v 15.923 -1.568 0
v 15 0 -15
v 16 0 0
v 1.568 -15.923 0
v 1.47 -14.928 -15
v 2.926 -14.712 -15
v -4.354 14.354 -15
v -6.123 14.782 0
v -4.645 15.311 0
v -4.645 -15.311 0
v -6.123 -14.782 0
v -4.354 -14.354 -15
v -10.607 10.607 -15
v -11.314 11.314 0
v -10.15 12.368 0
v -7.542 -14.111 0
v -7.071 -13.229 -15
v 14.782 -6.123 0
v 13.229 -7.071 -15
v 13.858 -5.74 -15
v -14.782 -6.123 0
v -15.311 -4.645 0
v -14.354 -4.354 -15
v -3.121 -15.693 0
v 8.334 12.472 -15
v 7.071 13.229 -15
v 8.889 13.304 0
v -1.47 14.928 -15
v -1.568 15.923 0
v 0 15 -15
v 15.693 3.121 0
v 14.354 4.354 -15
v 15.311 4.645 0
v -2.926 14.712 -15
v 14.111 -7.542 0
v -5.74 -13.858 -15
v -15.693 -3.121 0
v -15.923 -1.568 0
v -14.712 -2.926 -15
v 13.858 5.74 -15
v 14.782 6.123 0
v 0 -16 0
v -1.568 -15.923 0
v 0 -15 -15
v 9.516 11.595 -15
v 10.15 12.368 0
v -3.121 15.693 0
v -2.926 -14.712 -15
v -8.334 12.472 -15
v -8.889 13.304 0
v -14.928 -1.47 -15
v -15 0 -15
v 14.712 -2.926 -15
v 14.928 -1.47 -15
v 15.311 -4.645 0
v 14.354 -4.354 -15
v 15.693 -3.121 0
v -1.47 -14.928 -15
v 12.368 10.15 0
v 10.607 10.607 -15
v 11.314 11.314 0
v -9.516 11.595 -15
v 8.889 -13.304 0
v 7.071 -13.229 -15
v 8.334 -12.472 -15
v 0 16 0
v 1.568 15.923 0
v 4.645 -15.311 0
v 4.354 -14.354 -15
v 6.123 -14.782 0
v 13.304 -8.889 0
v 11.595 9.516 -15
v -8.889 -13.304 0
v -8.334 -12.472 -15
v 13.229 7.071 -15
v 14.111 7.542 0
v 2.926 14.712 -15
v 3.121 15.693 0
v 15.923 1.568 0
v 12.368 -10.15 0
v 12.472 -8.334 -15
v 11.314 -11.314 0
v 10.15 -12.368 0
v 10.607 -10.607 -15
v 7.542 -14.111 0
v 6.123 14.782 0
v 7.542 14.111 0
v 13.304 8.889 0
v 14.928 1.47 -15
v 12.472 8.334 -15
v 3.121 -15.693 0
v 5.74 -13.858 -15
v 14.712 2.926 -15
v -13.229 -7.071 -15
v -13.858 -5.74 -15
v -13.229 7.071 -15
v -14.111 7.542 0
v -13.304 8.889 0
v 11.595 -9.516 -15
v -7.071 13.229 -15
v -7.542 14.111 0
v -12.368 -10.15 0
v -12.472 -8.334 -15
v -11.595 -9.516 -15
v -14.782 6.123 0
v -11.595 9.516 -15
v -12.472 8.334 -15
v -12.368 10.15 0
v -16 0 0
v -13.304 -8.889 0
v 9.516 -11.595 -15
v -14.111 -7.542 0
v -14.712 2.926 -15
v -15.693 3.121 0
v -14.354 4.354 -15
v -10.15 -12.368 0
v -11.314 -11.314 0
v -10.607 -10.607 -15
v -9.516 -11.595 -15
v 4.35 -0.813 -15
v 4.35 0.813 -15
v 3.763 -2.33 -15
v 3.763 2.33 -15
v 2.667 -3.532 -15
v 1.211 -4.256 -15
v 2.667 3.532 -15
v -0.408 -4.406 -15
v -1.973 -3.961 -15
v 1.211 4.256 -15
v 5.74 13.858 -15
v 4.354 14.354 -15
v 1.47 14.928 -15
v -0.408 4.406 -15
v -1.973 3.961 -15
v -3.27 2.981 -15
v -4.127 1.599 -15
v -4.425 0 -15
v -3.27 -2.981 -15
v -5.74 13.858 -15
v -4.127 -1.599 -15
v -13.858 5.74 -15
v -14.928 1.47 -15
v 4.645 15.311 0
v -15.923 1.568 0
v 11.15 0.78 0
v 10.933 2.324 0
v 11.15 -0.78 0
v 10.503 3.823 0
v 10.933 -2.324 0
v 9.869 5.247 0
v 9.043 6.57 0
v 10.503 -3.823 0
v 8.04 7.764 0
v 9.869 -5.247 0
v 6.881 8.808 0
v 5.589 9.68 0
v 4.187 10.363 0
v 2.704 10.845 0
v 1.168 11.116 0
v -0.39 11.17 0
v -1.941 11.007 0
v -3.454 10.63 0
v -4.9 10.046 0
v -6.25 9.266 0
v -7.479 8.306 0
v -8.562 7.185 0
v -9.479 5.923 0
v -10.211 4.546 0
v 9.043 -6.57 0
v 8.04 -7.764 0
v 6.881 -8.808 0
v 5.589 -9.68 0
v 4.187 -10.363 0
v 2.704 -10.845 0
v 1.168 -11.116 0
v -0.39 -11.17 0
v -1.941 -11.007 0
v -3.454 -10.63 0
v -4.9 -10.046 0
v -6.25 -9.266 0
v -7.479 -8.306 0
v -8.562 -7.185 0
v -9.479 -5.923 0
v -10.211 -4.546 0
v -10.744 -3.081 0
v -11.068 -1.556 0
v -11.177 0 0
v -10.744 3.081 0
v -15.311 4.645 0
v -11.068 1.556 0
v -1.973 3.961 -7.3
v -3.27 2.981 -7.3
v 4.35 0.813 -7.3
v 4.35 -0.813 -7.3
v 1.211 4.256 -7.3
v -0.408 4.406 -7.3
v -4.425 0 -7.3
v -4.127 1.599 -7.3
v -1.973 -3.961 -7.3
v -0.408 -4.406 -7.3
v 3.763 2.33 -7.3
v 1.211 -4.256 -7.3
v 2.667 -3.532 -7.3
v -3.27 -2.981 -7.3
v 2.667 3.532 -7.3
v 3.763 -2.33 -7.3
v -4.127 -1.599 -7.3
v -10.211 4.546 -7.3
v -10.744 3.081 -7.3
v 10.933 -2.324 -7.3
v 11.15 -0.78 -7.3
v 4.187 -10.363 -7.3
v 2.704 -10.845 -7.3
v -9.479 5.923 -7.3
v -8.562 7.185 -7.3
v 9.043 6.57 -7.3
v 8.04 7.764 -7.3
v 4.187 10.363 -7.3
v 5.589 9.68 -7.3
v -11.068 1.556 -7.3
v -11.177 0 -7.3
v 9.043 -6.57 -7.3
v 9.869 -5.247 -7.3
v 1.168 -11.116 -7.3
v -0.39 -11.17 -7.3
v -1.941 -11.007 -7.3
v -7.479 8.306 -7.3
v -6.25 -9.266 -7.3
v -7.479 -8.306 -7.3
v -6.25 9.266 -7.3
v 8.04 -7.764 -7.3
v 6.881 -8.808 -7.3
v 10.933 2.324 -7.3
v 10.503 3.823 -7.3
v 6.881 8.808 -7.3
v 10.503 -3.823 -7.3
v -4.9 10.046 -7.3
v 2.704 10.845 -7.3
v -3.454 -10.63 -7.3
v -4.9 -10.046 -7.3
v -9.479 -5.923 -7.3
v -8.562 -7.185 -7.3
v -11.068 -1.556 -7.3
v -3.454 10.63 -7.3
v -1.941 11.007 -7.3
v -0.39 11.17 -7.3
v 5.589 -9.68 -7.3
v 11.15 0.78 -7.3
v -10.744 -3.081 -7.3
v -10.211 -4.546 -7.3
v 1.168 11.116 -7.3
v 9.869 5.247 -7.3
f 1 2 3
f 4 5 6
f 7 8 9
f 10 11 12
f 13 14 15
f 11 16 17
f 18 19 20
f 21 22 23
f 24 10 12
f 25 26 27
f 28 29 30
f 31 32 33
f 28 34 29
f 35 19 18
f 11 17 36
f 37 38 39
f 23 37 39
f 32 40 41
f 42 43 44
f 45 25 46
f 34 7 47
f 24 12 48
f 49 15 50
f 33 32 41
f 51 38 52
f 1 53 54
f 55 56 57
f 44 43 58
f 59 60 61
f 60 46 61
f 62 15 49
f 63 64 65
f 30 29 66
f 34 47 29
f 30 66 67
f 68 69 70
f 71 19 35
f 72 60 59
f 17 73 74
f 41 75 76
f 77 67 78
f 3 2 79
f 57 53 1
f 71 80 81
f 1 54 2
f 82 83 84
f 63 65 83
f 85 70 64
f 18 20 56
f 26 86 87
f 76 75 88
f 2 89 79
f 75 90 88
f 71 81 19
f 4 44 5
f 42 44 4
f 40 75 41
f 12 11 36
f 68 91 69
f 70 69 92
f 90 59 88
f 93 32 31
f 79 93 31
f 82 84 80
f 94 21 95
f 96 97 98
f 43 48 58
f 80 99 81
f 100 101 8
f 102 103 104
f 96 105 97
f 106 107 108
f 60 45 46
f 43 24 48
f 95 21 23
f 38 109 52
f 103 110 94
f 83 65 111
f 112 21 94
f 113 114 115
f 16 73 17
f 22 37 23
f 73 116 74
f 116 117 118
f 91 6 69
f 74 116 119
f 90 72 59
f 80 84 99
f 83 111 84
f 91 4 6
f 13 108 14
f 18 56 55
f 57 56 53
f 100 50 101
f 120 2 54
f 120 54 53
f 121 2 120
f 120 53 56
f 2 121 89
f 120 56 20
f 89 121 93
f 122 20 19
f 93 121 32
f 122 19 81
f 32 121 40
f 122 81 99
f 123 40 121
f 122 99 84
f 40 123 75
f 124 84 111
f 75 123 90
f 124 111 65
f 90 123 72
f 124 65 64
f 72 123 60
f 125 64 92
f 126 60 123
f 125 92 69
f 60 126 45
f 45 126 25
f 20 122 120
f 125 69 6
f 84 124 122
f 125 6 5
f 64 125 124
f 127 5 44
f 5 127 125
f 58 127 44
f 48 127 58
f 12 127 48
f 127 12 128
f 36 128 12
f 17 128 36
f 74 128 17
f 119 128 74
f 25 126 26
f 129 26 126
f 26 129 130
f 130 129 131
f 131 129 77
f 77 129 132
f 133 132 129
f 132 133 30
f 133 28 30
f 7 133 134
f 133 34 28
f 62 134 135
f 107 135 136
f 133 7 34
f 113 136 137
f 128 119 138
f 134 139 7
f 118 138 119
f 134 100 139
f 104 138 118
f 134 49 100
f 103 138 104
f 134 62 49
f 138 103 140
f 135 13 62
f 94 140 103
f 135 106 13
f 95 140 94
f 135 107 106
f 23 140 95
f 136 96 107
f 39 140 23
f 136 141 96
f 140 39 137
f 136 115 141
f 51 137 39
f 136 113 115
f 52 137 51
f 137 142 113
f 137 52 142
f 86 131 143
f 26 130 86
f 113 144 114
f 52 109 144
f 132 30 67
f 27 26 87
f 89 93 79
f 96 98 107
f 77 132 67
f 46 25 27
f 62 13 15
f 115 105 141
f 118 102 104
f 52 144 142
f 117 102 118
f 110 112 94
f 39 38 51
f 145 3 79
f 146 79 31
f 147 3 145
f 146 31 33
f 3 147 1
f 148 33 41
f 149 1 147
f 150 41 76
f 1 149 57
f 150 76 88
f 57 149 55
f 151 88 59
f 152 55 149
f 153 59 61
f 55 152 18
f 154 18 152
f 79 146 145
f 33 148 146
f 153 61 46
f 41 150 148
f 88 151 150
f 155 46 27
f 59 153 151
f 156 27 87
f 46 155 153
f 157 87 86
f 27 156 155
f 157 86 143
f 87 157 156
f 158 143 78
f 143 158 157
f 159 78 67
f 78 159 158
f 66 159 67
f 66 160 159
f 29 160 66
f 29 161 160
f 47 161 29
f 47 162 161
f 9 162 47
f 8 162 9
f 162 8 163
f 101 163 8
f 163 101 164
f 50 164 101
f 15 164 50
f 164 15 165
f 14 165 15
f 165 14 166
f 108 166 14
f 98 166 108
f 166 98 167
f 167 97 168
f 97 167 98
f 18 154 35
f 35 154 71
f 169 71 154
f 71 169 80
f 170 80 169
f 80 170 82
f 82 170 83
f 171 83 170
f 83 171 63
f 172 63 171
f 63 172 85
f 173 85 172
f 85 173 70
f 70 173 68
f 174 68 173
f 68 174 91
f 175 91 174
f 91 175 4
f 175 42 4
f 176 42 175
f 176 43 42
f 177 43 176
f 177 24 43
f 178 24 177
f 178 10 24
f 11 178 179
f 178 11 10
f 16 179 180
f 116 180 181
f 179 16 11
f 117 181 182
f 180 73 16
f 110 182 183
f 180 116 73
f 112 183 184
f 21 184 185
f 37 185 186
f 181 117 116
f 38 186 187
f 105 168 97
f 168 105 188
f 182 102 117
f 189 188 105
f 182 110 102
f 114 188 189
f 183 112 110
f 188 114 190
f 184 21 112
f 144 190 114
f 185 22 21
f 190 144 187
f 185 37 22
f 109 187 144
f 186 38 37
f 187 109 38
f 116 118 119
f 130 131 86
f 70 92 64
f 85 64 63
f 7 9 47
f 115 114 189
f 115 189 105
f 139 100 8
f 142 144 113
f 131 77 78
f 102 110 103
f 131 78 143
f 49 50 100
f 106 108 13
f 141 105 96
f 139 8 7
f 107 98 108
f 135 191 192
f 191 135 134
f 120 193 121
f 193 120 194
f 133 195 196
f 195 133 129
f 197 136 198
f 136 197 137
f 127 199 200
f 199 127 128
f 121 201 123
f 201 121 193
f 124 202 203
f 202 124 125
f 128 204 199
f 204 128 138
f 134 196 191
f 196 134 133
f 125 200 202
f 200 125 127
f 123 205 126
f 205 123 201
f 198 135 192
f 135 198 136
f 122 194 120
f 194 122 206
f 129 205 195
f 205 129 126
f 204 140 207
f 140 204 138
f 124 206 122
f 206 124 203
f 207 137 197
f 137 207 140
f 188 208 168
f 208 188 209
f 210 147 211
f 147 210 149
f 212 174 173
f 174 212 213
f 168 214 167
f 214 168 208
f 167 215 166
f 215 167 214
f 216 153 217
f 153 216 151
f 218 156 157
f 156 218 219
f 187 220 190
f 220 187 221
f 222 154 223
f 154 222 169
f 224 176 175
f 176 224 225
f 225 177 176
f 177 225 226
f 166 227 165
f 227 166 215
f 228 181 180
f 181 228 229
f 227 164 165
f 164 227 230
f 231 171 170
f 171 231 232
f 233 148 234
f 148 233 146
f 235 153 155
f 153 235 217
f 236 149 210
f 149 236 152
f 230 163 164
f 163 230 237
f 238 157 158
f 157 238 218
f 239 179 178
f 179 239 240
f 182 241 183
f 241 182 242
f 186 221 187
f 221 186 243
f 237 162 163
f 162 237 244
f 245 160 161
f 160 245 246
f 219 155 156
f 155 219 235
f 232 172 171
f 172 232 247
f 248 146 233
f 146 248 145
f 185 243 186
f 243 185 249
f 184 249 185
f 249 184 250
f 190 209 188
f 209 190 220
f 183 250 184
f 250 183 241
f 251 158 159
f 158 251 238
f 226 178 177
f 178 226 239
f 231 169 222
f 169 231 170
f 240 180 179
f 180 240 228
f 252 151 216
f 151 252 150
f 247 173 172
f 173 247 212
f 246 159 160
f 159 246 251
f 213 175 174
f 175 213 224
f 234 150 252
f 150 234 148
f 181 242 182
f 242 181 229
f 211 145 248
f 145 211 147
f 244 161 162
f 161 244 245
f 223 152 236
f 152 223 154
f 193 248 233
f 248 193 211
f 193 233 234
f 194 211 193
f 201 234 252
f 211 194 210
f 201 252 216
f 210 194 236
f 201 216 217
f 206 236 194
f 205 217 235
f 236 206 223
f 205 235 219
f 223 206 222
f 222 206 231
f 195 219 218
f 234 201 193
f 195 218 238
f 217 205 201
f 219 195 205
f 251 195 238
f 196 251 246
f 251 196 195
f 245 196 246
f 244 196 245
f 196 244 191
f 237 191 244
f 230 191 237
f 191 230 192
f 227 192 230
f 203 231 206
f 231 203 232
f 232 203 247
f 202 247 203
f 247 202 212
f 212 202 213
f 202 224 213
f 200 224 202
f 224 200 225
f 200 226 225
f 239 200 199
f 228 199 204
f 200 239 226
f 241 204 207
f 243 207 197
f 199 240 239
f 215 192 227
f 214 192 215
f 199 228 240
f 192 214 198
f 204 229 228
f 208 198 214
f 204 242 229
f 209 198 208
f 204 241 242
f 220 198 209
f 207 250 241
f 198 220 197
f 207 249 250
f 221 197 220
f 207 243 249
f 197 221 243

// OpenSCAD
// file: inc/functions.scad
// PRUSA iteration3
// Functions used in many files
// GNU GPL v3
// Josef Průša <josefprusa@me.com>
// Václav 'ax' Hůla <axtheb@gmail.com>
// Vlnofka <>
// http://www.reprap.org/wiki/Prusa_Mendel
// http://github.com/prusajr/PrusaMendel

module roundcorner(diameter){
	difference(){
		cube(size = [diameter,diameter,99], center = false);
		translate(v = [diameter, diameter, 0]) cylinder(h = 100, r=diameter, center=true);
	}
}
module nut(d,h,horizontal=true){
    cornerdiameter =  (d / 2) / cos (180 / 6);
    cylinder(h = h, r = cornerdiameter, $fn = 6);
    if(horizontal){
        for(i = [1:6]){
            rotate([0,0,60*i]) translate([-cornerdiameter-0.2,0,0]) rotate([0,0,-45]) cube([2,2,h]);
        }
    }
}

// Based on nophead research
module polyhole(d, h, center=false) {
    n = max(round(2 * d),3);
    rotate([0,0,180])
        cylinder(h = h, r = (d / 2) / cos (180 / n), $fn = n);
}

// make it interchangeable between this and cylinder
module cylinder_poly(r, h, center=false){
    polyhole(d=r*2, h=h, center=center);
}

module fillet(radius, height=100, $fn=0) {
    //this creates acutal fillet
    translate([-radius, -radius, -height/2-0.01])
        difference() {
            cube([radius*2, radius*2, height+0.02]);
            cylinder(r=radius, h=height+0.02, $fn=$fn);
        }
}

module cube_fillet(size, radius=-1, vertical=[3,3,3,3], top=[0,0,0,0], bottom=[0,0,0,0], center=false, $fn=0){
    //
    if (center) {
        cube_fillet_inside(size, radius, vertical, top, bottom, $fn);
    } else {
        translate([size[0]/2, size[1]/2, size[2]/2])
            cube_fillet_inside(size, radius, vertical, top, bottom, $fn);
    }
}

module cube_negative_fillet(size, radius=-1, vertical=[3,3,3,3], top=[0,0,0,0], bottom=[0,0,0,0], $fn=0){

    j=[1,0,1,0];

    for (i=[0:3]) {
        if (radius > -1) {
            rotate([0, 0, 90*i]) translate([size[1-j[i]]/2, size[j[i]]/2, 0]) fillet(radius, size[2], $fn=$fn);
        } else {
            rotate([0, 0, 90*i]) translate([size[1-j[i]]/2, size[j[i]]/2, 0]) fillet(vertical[i], size[2], $fn=$fn);
        }
        rotate([90*i, -90, 0]) translate([size[2]/2, size[j[i]]/2, 0 ]) fillet(top[i], size[1-j[i]], $fn=$fn);
        rotate([90*(4-i), 90, 0]) translate([size[2]/2, size[j[i]]/2, 0]) fillet(bottom[i], size[1-j[i]], $fn=$fn);

    }
}

module cube_fillet_inside(size, radius=-1, vertical=[3,3,3,3], top=[0,0,0,0], bottom=[0,0,0,0], $fn=0){
    //makes CENTERED cube with round corners
    // if you give it radius, it will fillet vertical corners.
    //othervise use vertical, top, bottom arrays
    //when viewed from top, it starts in upper right corner (+x,+y quadrant) , goes counterclockwise
    //top/bottom fillet starts in direction of Y axis and goes CCW too


    if (radius == 0) {
        cube(size, center=true);
    } else {
        difference() {
            cube(size, center=true);
            cube_negative_fillet(size, radius, vertical, top, bottom, $fn);
        }
    }
}


module nema17(places=[1,1,1,1], size=15.5, h=10, holes=false, shadow=false, $fn=24){
    for (i=[0:3]) {
        if (places[i] == 1) {
            rotate([0, 0, 90*i]) translate([size, size, 0]) {
                if (holes) {
                    #rotate([0, 0, -90*i])  translate([0,0,-10]) screw(r=1.7, slant=false, head_drop=13, $fn=$fn, h=h+12);
                } else {
                    rotate([0, 0, -90*i]) cylinder(h=h, r=5.5, $fn=$fn);
                }
            }
        }
    }
    if (shadow != false) {
        %translate ([0, 0, shadow+21+3]) cube([42,42,42], center = true);
    //flange
        %translate ([0, 0, shadow+21+3-21-1]) cylinder(r=11,h=2, center = true, $fn=20);
    //shaft
        %translate ([0, 0, shadow+21+3-21-7]) cylinder(r=2.5,h=14, center = true);
    }
}

module screw(h=20, r=2, r_head=3.5, head_drop=0, slant=true, poly=false, $fn=0){
    //makes screw with head
    //for substraction as screw hole
    if (poly) {
        cylinder_poly(h=h, r=r, $fn=$fn);
    } else {
        cylinder(h=h, r=r, $fn=$fn);
    }
    if (slant) {
        translate([0, 0, head_drop-0.01]) cylinder(h=r_head, r2=0, r1=r_head, $fn=$fn);
    }

    if (head_drop > 0) {
        translate([0, 0, -0.01]) cylinder(h=head_drop+0.01, r=r_head, $fn=$fn);
    }
}
module screw_cylinder(r_head=5.25,r=3.25,head_drop=6.2,slant=false){
	screw(r_head=r_head,head_drop=head_drop,r=r, slant=slant);

}

//screw_cylinder();
//cube_fillet([10,20,30], vertical=[3,2,0,0], top=[3,2,0,5], bottom=[3,2,0,5]);
//cube_fillet([10,20,30], radius=2, top=[7,2,7,2]);
// file: inc/metric.scad
// PRUSA iteration3
// Default metric sizes
// GNU GPL v3
// Josef Průša <josefprusa@me.com>
// http://www.reprap.org/wiki/Prusa_Mendel
// http://github.com/prusajr/PrusaMendel

// DONT CHANGE THIS FILE! ALTER VALUES IN CONFIGURATION.SCAD INSTEAD

// RODS

threaded_rod_diameter = 8.7;
threaded_rod_diameter_horizontal = 8.7;
smooth_bar_diameter = 8;
smooth_bar_diameter_horizontal = 8.8;

// Nuts and bolts

m8_diameter = 9;
m8_nut_diameter = 14.1;

m4_diameter = 4.5;
m4_nut_diameter = 9;
m4_nut_diameter_horizontal=4.8;

m3_diameter = 3.6;
m3_nut_diameter = 5.3;
m3_nut_diameter_horizontal = 6.1;

// Bushing holder

bushing_core_diameter = smooth_bar_diameter;
bushing_material_thickness = 1;

// Motors

motor_shaft = 5.5;
// main file
include <inc/metric.scad>
include <inc/functions.scad>

hole_for_608=22.3;
608_width=7.4;

//spool_bottom();
rotate([-180,0,0])center_spool();
//rotate([-90,0,0])rod_spool();

module spool_bottom(){
	difference(){
		cube_fillet([30,45,5],top=[2,2,2,2],vertical=[2,2,2,2],center=true);
		translate([0,0,-3])nut(h=6,horizontal=true,d=m8_nut_diameter,center=true);
		translate([0,16,7])rotate([0,180,0])screw_cylinder();
		translate([0,-16,7])rotate([0,180,0])screw_cylinder();
	}
/**/
	difference(){
		translate([0,0,15])cylinder(r1=10,r2=6.1,h=25,center=true);
		translate([0,0,15])cylinder(r=threaded_rod_diameter/2,h=25.1,center=true);
	}

}


module rod_spool(){
/**/
	difference(){
		polyhole(20,15);
		translate([0,0,-0.5])polyhole(threaded_rod_diameter,31);
	}

	union(){
		translate([-7,6,0]){
			difference(){
				translate([7,23.5,7])rotate(a=[90,0,0])polyhole(threaded_rod_diameter+4,25);
				//cube([15,25,15]);
				translate([7,40.1,7])rotate(a=[90,0,0])polyhole(threaded_rod_diameter,50);
				
			}
		}

		
	}

}



module center_spool(){
/**/
	difference(){
		translate([0,0,7.5])cylinder(r1=16,r2=15,center=true,h=15,$fn=64);
		
		polyhole(threaded_rod_diameter,30.1);
		translate([0,0,-0.1])polyhole(hole_for_608,608_width);
		
	}

	

}
